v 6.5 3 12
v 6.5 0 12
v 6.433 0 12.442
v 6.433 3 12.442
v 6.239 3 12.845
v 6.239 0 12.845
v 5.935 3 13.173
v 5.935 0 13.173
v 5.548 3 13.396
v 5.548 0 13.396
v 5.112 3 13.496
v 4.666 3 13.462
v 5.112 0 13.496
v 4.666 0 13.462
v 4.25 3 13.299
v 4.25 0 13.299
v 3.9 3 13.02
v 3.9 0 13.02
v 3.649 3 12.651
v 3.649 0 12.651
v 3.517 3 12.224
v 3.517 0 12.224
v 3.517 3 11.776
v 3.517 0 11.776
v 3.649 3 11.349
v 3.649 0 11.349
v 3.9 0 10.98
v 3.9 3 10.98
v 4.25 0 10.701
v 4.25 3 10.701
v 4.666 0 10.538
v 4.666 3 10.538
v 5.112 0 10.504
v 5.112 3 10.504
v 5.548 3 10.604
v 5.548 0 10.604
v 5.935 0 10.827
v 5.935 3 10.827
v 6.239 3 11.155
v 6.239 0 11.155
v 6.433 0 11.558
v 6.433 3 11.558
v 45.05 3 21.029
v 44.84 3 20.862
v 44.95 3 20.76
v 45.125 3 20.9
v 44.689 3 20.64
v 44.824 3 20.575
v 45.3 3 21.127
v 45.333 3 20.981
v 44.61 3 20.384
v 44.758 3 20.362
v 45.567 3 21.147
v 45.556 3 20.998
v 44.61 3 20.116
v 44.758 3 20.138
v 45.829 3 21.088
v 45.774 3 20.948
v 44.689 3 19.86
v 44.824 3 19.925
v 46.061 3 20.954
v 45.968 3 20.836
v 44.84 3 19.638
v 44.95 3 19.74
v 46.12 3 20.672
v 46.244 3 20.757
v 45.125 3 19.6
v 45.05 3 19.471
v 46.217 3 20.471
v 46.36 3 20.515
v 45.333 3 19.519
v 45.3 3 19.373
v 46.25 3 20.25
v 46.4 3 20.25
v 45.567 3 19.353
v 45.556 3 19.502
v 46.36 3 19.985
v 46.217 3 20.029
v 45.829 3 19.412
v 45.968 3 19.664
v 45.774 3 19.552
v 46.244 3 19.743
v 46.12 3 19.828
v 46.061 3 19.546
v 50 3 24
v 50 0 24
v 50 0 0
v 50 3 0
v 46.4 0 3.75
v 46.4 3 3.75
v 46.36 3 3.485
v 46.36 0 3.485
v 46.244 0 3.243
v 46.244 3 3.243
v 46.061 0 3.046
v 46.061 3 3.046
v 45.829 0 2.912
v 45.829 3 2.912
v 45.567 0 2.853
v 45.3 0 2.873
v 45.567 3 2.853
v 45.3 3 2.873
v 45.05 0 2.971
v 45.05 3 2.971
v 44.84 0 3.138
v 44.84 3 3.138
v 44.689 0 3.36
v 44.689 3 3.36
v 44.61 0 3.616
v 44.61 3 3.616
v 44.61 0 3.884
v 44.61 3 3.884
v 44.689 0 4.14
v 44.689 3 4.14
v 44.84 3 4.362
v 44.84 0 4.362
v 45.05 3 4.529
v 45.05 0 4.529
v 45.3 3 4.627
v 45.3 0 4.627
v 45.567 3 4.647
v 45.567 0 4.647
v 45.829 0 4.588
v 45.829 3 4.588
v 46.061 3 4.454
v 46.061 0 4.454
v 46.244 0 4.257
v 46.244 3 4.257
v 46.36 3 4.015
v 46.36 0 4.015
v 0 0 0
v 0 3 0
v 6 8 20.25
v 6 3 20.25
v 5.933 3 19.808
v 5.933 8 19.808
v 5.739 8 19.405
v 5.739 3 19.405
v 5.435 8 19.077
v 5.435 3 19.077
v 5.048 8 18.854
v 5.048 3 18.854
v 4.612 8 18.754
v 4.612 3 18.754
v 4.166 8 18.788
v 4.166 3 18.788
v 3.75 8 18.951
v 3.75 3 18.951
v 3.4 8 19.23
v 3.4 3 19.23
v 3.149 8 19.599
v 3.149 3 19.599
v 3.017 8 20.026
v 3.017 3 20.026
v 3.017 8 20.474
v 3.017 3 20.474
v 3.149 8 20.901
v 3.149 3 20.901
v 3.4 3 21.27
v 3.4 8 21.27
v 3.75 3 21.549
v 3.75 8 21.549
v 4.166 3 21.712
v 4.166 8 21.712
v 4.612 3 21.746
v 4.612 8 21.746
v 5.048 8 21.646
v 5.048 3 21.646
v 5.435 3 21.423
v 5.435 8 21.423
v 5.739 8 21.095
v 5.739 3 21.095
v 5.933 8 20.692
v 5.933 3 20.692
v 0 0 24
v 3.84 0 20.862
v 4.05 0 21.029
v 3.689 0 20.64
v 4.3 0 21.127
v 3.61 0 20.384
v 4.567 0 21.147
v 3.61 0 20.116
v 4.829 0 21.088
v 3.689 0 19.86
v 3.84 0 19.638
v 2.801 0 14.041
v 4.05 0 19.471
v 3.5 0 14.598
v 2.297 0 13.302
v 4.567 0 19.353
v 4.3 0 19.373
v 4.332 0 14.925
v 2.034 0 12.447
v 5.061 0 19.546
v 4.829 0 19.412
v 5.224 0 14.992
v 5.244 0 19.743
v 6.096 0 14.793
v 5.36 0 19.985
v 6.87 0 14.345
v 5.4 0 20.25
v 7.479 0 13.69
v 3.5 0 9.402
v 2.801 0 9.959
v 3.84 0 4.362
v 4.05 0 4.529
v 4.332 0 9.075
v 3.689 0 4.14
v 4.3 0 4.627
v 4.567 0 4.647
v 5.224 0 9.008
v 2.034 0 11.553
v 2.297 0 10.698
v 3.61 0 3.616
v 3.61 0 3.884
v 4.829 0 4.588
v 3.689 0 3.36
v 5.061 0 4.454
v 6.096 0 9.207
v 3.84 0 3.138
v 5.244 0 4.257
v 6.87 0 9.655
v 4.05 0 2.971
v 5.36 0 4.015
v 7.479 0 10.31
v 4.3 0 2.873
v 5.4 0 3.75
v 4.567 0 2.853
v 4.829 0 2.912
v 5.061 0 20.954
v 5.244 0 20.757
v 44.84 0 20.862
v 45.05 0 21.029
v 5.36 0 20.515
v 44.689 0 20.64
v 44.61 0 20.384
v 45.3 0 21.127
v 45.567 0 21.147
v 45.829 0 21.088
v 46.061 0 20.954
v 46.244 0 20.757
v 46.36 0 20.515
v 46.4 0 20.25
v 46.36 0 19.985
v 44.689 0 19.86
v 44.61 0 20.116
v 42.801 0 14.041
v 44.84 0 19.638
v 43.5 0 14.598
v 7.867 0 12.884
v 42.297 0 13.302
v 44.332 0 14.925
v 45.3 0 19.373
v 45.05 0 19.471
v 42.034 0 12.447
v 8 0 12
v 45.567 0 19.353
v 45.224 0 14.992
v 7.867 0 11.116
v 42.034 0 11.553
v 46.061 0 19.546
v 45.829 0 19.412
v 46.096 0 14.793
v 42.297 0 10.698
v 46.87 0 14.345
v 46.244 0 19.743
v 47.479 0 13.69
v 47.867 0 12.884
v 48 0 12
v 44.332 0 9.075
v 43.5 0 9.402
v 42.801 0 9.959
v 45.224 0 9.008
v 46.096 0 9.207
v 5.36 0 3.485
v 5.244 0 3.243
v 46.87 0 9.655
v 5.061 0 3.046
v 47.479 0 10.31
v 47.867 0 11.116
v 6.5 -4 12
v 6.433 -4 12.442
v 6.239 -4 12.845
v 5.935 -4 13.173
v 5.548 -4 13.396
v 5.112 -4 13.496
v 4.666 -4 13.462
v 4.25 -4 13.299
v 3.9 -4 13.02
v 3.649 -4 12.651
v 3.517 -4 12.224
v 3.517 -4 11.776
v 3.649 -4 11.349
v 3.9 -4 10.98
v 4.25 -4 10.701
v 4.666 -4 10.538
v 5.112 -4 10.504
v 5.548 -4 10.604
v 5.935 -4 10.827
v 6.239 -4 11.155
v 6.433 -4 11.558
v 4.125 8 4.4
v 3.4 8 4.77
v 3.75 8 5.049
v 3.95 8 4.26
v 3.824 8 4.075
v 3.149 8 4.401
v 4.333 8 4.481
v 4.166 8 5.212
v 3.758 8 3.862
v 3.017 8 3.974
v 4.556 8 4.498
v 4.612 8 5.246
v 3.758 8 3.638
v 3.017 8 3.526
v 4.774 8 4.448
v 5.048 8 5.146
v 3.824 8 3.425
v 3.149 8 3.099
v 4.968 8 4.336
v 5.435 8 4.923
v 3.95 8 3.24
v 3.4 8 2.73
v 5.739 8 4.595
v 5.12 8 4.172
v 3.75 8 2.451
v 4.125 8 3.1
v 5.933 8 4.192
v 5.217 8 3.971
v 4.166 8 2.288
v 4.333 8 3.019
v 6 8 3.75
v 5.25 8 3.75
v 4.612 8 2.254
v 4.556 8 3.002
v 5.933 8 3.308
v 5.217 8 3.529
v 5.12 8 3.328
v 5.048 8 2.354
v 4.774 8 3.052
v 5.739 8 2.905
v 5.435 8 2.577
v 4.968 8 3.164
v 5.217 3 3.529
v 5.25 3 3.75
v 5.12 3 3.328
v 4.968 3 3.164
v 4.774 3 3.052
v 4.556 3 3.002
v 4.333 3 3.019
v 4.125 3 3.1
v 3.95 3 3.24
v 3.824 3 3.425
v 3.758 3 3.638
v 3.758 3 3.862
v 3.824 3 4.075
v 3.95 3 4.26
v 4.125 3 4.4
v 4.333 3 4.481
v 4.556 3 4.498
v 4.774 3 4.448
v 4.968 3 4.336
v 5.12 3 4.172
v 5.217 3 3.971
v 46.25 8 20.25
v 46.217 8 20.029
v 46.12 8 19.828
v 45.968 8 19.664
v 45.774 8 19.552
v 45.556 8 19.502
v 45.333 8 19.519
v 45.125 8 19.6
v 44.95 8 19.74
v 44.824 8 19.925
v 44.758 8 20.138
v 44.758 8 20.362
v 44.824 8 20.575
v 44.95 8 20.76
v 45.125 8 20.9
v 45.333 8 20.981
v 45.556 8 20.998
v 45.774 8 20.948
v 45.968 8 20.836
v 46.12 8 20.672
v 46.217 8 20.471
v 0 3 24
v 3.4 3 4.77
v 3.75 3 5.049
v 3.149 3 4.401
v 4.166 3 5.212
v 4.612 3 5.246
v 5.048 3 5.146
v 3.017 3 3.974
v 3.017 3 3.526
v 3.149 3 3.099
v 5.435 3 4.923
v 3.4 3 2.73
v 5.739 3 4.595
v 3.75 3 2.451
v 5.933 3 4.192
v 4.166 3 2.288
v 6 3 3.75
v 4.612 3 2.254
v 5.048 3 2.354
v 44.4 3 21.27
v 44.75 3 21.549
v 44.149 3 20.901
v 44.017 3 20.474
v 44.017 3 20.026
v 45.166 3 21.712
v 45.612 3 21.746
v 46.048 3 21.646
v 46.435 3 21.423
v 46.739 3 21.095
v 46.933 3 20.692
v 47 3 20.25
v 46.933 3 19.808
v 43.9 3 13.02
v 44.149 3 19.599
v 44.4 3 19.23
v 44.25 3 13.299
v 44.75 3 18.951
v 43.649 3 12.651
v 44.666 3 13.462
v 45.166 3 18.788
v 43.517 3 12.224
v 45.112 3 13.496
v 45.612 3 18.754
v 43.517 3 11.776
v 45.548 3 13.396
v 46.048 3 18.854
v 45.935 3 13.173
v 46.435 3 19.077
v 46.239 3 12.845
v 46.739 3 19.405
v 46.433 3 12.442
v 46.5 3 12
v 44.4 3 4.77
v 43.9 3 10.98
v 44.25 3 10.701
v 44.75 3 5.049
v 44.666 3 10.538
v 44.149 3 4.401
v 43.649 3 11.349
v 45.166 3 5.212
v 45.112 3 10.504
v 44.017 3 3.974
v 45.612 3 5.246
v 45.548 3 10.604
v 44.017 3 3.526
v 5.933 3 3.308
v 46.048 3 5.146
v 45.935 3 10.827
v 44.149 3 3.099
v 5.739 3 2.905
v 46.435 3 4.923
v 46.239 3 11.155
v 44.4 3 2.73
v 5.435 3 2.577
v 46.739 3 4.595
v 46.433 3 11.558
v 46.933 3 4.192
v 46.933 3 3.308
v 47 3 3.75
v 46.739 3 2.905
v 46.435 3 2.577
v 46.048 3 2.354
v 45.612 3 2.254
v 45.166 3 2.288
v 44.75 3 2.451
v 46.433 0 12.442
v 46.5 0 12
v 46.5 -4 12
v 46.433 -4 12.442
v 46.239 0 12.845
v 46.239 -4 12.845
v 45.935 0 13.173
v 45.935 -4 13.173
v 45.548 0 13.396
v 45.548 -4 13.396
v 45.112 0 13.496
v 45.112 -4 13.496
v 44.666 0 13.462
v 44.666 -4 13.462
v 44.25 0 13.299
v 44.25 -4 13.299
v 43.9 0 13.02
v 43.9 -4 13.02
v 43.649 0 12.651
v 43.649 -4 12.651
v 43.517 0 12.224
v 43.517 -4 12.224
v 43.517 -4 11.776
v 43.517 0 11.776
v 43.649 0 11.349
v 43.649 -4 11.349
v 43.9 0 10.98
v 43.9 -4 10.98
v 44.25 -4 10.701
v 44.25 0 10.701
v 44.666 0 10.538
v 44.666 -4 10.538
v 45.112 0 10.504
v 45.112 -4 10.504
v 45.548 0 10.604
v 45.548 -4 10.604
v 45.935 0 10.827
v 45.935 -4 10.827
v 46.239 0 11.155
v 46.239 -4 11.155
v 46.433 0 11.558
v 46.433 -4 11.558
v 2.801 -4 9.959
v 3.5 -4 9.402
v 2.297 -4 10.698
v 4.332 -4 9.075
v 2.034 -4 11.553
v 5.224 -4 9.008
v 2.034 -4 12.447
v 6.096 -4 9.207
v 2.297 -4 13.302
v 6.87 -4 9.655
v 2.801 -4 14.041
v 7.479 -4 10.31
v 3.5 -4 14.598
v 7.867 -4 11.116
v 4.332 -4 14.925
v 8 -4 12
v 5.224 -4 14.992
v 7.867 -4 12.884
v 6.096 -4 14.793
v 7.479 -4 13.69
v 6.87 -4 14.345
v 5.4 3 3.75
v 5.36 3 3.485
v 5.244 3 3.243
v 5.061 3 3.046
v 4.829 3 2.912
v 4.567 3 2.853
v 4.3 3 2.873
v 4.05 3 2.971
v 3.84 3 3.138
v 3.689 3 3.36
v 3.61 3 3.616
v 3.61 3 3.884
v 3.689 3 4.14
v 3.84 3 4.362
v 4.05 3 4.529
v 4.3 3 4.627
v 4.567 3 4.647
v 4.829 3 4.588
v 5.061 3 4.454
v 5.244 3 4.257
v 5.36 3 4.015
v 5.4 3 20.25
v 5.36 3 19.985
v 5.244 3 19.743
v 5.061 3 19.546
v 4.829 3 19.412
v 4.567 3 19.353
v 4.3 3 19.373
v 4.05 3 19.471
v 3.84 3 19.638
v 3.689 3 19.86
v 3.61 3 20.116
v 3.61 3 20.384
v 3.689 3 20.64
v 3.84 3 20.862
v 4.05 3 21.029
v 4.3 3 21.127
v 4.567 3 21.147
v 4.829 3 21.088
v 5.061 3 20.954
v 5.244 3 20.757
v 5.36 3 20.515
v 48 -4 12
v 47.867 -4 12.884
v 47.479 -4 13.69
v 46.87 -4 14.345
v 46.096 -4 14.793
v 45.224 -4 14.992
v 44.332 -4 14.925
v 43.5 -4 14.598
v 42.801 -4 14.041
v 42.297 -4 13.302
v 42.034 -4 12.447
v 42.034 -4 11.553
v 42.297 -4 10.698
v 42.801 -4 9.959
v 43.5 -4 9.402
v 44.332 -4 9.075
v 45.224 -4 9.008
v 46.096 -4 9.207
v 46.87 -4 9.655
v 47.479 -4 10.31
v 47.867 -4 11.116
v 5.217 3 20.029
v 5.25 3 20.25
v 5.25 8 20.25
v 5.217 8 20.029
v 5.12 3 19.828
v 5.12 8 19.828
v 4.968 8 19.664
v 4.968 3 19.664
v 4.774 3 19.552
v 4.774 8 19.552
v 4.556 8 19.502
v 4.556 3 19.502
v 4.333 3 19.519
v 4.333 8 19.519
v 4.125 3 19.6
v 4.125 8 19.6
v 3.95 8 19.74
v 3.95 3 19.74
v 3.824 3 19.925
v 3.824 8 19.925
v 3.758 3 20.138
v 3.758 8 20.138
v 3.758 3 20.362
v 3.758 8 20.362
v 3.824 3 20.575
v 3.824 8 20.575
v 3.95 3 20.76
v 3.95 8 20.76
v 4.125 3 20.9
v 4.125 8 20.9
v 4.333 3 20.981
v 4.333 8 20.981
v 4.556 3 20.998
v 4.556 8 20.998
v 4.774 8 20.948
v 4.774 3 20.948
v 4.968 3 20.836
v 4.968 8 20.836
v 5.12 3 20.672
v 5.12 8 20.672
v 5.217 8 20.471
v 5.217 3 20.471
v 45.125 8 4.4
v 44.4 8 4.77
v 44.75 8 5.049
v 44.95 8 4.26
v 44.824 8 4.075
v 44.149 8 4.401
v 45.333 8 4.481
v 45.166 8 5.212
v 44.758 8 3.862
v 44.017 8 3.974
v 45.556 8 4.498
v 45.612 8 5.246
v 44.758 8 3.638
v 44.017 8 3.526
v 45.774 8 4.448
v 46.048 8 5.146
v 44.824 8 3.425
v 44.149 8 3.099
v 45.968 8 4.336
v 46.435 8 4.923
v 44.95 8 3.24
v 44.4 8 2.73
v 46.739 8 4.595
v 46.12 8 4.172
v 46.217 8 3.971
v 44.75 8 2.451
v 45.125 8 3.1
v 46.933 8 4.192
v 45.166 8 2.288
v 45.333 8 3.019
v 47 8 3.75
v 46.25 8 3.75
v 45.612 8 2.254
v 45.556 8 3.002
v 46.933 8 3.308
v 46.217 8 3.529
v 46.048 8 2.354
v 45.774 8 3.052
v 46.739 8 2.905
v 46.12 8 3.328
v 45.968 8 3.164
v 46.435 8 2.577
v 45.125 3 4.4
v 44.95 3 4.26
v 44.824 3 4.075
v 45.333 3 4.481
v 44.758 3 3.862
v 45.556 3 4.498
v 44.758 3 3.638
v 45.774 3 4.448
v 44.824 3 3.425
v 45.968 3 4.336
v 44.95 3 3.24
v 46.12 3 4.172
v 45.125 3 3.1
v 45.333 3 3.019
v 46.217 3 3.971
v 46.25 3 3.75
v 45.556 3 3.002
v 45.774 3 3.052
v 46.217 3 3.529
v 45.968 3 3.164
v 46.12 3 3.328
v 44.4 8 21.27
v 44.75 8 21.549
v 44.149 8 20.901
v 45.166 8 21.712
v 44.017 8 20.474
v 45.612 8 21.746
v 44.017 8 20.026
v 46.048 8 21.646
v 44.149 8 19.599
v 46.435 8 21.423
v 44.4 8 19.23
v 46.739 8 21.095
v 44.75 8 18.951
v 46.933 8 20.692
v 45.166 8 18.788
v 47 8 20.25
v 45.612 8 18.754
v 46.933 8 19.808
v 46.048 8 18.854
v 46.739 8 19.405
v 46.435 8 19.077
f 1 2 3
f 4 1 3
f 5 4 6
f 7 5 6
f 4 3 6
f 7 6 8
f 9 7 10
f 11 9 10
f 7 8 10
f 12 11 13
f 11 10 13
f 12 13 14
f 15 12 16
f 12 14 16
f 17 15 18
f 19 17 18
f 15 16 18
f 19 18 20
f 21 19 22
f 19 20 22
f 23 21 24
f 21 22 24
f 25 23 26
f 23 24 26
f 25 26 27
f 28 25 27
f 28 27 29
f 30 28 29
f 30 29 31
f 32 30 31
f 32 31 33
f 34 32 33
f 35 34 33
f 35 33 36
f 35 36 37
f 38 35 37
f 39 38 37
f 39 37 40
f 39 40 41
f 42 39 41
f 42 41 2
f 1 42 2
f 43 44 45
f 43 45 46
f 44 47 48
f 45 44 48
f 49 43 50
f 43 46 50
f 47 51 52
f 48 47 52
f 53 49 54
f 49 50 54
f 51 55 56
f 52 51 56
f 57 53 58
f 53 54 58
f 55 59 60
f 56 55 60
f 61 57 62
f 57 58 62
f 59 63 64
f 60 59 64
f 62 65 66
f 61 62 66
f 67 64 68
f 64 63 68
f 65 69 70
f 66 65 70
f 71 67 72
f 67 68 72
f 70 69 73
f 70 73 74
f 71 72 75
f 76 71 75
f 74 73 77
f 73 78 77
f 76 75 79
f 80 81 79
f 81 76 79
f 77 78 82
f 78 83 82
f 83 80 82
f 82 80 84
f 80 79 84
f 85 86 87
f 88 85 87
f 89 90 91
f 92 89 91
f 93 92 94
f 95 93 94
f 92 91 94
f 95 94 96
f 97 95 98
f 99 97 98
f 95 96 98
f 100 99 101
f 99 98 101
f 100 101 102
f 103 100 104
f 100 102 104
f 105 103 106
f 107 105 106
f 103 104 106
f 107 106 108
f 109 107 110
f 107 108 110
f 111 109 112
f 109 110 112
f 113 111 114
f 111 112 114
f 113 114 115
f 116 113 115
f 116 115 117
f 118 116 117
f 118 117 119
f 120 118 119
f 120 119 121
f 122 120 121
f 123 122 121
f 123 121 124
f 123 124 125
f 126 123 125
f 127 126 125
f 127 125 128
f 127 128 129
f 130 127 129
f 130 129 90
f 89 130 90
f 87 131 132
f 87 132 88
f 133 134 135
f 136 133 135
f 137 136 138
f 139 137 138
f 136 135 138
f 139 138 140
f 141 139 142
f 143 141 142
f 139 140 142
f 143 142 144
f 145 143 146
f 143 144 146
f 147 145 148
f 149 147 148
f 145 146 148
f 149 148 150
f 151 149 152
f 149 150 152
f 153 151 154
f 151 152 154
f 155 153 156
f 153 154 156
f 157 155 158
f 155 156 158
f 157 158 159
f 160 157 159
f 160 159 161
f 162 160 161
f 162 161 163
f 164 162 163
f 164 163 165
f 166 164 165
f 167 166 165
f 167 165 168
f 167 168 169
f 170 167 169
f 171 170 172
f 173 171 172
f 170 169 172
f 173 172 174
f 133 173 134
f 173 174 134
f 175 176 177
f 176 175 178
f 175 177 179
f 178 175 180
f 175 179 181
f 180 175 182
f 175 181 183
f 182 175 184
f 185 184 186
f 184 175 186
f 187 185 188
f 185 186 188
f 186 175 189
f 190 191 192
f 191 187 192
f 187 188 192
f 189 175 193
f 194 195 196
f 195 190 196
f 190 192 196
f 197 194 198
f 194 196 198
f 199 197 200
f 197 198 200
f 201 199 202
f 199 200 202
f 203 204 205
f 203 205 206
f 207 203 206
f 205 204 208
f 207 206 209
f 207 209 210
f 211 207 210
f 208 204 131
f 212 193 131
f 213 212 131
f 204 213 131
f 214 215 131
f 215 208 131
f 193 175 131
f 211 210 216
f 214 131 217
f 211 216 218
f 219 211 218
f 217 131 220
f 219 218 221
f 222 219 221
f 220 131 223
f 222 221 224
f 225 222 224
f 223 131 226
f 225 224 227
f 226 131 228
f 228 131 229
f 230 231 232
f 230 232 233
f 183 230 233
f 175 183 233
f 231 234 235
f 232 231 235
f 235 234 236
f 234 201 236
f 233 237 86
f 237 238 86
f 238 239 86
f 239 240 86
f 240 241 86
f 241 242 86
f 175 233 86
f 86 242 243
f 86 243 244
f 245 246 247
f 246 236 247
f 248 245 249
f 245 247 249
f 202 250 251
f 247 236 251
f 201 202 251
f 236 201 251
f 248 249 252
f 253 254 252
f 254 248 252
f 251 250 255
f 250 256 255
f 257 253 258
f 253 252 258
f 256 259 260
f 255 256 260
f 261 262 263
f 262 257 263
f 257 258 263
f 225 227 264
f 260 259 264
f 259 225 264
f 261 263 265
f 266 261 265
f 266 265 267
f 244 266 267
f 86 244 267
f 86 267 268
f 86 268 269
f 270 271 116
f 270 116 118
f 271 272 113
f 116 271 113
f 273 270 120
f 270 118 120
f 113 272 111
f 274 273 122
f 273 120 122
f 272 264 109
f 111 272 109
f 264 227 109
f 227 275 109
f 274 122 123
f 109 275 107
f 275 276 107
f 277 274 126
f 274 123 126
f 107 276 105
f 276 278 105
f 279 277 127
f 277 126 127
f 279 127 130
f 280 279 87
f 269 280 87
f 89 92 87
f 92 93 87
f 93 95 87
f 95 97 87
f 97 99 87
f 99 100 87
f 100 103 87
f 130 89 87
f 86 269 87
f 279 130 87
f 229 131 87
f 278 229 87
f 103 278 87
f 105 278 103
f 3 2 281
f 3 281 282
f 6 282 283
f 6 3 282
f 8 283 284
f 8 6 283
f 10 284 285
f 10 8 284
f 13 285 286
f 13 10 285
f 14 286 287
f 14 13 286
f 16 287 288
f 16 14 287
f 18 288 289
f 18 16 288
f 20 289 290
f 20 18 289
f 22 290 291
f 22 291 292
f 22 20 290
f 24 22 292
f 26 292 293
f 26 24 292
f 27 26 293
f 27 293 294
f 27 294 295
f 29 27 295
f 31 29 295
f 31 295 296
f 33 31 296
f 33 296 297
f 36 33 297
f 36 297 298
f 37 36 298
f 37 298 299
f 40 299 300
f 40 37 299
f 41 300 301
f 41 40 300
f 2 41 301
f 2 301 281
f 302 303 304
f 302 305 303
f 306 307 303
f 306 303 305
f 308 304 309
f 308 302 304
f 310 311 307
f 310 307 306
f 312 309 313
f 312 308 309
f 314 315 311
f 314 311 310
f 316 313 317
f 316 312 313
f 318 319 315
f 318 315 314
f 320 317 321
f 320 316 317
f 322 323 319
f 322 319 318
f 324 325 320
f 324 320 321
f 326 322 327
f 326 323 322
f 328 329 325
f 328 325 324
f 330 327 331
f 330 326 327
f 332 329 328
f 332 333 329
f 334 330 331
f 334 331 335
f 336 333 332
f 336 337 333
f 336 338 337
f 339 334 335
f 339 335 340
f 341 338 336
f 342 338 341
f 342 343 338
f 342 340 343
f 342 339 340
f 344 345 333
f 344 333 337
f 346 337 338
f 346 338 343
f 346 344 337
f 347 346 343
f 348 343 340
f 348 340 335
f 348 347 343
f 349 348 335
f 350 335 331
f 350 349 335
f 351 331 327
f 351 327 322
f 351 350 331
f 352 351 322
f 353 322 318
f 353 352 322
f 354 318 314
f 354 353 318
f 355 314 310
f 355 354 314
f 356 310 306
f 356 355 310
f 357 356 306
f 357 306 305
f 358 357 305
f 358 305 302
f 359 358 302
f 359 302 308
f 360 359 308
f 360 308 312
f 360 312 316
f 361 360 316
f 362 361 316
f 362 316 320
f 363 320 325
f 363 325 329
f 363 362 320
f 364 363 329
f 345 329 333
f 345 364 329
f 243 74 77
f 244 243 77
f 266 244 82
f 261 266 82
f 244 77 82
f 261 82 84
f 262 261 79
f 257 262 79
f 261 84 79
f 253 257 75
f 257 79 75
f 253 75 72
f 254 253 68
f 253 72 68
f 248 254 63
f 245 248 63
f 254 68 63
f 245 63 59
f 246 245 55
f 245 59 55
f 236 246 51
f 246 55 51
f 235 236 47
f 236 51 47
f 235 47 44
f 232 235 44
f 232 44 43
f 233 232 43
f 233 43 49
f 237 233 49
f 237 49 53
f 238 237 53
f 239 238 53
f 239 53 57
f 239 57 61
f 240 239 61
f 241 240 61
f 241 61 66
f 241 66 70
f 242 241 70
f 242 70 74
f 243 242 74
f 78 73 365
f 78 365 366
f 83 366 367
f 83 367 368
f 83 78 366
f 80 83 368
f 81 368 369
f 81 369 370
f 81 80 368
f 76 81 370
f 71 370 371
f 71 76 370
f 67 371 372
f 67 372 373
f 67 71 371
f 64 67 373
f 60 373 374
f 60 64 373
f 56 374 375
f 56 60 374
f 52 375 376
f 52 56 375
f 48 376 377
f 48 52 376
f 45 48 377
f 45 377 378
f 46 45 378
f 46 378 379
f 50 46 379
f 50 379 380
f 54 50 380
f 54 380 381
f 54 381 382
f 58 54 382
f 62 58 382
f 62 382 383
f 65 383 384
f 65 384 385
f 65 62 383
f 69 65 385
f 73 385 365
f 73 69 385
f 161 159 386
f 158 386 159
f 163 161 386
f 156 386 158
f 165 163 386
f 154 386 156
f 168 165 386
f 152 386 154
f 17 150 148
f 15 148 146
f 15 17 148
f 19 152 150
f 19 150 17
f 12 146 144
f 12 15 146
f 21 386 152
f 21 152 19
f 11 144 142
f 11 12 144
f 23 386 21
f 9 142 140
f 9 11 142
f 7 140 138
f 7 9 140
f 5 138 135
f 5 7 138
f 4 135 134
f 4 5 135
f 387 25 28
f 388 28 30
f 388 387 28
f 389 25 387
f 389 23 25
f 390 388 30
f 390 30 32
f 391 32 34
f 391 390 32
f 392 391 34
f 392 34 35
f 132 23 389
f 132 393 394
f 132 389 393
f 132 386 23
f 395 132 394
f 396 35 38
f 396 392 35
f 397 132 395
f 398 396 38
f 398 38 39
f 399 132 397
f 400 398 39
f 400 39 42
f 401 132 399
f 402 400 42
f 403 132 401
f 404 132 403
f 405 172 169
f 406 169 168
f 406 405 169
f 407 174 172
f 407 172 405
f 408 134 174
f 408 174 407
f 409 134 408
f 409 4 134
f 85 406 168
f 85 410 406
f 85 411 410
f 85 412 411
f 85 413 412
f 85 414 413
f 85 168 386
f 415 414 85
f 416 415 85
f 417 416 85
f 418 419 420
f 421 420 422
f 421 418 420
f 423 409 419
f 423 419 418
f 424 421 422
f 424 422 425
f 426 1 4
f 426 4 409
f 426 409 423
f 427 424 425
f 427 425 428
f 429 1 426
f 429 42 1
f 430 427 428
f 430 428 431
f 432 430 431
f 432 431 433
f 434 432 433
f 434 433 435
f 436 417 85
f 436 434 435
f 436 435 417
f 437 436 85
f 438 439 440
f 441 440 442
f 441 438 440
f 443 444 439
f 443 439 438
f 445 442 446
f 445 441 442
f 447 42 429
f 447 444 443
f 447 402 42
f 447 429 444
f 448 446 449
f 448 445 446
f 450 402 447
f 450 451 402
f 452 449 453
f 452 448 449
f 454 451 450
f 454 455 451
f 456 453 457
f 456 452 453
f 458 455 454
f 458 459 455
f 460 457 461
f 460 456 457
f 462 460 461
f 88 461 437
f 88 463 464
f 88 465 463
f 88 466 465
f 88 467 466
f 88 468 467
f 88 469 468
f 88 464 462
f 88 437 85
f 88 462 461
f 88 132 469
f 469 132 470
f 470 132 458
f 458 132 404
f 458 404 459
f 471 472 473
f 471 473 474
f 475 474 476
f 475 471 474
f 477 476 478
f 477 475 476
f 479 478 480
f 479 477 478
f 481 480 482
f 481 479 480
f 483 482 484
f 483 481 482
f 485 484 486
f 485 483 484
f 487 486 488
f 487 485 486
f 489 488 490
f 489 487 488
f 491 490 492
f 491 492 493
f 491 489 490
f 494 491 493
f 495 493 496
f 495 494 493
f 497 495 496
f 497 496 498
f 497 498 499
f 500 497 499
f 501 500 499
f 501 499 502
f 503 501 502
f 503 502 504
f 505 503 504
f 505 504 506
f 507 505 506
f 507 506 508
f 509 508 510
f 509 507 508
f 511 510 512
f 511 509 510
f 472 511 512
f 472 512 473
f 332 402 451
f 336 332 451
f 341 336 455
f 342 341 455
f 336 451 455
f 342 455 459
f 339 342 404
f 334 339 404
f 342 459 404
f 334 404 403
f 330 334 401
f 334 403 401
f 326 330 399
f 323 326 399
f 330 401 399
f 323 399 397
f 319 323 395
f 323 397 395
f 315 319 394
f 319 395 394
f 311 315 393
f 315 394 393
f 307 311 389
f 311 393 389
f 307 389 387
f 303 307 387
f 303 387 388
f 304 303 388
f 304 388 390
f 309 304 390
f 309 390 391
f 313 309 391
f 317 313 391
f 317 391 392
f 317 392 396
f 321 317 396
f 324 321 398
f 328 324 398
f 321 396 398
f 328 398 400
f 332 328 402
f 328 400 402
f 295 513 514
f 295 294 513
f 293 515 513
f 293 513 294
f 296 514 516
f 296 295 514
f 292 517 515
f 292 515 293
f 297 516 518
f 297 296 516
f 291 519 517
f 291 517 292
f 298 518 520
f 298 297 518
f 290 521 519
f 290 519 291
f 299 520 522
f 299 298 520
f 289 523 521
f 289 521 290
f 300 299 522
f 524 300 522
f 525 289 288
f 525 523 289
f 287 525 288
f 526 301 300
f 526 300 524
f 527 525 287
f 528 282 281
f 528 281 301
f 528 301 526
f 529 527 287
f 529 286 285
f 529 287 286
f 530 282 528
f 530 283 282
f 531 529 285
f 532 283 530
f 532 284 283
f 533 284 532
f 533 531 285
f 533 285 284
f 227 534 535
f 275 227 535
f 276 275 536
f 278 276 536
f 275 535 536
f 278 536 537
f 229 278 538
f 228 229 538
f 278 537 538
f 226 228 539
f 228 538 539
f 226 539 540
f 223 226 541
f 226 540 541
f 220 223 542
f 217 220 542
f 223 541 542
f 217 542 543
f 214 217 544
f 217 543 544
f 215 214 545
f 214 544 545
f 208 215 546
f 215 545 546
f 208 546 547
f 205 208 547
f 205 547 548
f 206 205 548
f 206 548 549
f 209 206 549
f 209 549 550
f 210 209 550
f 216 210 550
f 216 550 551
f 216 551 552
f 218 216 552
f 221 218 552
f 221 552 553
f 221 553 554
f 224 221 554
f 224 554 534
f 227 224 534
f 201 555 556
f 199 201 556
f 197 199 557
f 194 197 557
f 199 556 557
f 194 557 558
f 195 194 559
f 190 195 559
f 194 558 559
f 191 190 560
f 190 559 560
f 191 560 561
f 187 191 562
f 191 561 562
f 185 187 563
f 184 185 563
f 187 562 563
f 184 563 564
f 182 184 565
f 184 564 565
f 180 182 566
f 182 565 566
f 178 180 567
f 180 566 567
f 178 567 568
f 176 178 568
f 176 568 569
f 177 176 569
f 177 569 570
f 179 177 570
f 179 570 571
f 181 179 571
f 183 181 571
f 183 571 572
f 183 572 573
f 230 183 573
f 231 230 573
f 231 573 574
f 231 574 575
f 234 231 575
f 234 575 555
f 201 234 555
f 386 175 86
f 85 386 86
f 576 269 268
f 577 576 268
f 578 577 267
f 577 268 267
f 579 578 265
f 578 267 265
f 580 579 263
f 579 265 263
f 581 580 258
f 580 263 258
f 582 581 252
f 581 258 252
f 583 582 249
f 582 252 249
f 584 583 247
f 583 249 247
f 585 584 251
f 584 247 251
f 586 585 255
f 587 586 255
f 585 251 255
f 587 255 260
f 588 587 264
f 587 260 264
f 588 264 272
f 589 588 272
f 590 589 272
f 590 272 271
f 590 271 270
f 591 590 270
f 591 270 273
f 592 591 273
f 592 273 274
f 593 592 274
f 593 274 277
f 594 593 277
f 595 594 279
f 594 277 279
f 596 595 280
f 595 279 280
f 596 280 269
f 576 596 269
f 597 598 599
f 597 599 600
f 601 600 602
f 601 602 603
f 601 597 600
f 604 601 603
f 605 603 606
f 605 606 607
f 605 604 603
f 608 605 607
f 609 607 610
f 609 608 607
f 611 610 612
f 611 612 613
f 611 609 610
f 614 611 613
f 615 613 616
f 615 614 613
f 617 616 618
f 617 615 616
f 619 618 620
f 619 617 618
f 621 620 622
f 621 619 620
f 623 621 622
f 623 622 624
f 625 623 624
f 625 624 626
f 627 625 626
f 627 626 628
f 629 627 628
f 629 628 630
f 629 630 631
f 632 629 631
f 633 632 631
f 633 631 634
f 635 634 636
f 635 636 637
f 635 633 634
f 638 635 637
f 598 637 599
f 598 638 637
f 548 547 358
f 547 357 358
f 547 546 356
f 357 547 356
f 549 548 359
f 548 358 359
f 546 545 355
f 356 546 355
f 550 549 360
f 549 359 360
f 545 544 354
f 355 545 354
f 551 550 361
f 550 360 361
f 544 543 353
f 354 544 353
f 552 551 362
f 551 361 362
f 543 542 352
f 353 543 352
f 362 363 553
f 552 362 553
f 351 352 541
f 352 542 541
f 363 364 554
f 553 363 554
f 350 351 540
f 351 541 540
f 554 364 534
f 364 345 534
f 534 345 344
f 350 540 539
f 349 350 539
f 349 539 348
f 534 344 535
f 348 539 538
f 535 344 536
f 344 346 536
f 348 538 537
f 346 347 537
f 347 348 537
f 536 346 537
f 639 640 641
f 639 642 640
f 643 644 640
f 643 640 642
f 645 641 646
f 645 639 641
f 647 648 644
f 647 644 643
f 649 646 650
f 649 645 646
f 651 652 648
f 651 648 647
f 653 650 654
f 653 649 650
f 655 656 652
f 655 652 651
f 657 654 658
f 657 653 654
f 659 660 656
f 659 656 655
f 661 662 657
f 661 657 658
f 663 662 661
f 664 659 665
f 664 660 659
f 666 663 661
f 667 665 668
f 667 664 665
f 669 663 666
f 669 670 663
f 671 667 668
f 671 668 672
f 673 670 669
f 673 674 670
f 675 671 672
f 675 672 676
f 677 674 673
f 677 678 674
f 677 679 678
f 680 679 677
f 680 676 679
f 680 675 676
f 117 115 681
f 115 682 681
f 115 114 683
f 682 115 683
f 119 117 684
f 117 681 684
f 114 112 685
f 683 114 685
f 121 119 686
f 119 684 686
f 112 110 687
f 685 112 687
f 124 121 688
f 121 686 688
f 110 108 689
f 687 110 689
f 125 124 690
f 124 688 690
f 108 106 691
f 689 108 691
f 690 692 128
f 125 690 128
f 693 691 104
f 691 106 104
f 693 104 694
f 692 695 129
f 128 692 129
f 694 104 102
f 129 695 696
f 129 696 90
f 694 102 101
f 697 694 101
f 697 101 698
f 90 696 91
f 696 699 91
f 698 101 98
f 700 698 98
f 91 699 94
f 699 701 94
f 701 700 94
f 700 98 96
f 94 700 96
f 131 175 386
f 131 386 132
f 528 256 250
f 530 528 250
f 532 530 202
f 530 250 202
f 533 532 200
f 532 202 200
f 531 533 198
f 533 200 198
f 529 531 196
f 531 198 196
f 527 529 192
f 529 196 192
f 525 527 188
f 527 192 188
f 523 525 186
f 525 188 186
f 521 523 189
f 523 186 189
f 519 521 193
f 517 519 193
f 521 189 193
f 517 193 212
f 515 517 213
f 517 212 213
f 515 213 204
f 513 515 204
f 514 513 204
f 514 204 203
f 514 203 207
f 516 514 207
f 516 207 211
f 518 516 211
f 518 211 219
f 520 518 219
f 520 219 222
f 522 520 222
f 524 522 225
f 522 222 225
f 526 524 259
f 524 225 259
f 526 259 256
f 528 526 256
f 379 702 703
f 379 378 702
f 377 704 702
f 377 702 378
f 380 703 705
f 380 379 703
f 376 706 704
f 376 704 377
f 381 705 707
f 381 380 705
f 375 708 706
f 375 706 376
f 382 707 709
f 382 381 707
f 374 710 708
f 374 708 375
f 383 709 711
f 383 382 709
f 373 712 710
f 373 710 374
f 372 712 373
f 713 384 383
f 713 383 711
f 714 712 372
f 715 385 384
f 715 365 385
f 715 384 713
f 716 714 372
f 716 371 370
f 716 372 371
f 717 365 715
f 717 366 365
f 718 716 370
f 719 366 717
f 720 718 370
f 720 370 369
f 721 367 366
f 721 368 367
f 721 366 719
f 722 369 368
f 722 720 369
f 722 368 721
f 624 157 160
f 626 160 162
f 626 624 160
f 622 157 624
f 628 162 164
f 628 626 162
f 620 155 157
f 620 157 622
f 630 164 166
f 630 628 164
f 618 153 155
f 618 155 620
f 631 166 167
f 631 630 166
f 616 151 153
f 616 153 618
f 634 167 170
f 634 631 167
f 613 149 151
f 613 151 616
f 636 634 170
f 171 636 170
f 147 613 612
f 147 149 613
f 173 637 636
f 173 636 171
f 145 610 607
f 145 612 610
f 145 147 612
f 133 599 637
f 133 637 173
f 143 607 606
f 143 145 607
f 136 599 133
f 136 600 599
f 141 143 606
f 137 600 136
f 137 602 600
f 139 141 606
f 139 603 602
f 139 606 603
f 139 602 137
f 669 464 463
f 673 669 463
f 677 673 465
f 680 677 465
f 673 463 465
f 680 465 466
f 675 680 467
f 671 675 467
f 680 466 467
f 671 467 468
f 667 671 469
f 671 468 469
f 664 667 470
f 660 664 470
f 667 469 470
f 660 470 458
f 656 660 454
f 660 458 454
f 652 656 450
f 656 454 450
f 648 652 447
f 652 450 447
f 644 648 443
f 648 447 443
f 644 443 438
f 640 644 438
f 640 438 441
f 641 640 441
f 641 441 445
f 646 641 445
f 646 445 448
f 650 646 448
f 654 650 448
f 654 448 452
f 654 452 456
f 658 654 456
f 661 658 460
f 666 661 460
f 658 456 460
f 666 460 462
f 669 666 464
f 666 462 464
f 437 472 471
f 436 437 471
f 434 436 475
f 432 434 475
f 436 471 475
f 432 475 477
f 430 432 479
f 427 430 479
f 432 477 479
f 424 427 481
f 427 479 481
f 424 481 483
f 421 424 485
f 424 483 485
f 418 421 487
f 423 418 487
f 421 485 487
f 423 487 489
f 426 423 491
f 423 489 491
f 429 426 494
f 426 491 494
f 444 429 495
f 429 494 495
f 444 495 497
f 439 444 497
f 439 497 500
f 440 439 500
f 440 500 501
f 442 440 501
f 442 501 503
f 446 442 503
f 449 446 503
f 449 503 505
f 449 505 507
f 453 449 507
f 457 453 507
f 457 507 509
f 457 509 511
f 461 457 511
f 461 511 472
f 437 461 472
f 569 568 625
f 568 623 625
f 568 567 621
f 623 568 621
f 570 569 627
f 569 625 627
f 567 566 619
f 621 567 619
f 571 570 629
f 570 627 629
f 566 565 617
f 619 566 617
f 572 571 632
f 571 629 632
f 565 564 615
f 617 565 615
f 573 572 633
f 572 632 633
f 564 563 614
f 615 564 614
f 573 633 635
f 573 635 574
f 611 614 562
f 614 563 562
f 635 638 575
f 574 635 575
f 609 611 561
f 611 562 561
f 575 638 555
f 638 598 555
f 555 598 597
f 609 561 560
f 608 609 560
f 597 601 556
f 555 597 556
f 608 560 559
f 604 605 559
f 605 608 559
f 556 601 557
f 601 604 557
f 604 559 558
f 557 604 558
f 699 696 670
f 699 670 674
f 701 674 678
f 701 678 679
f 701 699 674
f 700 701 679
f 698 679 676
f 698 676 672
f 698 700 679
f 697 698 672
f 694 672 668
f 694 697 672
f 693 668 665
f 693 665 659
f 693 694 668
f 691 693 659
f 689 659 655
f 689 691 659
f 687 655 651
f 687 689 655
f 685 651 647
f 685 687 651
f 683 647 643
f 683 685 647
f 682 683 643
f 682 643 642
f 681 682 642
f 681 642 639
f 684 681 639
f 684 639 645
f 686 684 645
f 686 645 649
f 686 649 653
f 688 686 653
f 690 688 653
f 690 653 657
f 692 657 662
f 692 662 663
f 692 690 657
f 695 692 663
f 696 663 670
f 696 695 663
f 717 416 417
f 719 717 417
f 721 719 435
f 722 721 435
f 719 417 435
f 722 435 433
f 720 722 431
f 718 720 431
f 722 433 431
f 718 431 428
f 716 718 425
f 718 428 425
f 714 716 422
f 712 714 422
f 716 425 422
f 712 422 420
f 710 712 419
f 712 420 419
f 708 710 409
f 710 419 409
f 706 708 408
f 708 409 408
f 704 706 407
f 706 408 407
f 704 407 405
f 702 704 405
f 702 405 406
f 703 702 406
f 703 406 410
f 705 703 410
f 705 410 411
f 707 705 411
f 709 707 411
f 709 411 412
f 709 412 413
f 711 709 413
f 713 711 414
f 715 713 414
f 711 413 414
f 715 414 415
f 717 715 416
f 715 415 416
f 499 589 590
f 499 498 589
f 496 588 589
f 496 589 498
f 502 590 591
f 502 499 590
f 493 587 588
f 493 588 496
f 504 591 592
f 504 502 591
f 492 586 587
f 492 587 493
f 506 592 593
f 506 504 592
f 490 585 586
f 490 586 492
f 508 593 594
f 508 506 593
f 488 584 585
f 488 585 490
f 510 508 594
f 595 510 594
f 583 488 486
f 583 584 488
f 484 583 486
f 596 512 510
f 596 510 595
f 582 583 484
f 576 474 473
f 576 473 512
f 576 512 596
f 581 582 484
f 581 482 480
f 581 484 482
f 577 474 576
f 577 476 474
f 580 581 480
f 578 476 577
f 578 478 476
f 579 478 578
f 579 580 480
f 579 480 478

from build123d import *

# Parameters (mm, degrees)
SKETCH1_W           = 50
SKETCH1_H           = 24
BOSS_EXTRUDE1_DEPTH = 3
SKETCH2_R           = 3
SKETCH2_R_2         = 1.5
BOSS_EXTRUDE2_DEPTH = 4
SKETCH3_R           = 0.9
CUT_EXTRUDE1_DEPTH  = 10
SKETCH4_R           = 1.5
SKETCH4_R_2         = 0.75
BOSS_EXTRUDE3_DEPTH = 5
SKETCH5_R           = 1.5
CUT_EXTRUDE2_DEPTH  = 10


with BuildPart() as part:
    # Sketch1 → Boss-Extrude1 (new body)
    with BuildSketch(Plane(origin=(0, 0, 0), x_dir=(1, 0, 0), z_dir=(0, 1, 0))):
        with Locations((25, -12)):
            Rectangle(SKETCH1_W, SKETCH1_H)
    extrude(amount=BOSS_EXTRUDE1_DEPTH)

    # Sketch2 → Boss-Extrude2 (add)
    with BuildSketch(Plane.XZ):
        with Locations((5, 12)):
            Circle(SKETCH2_R)
        with Locations((5, 12)):
            Circle(SKETCH2_R_2, mode=Mode.SUBTRACT)
        with Locations((45, 12)):
            Circle(SKETCH2_R)
        with Locations((45, 12)):
            Circle(SKETCH2_R_2, mode=Mode.SUBTRACT)
    extrude(amount=BOSS_EXTRUDE2_DEPTH)

    # Sketch3 → Cut-Extrude1 (cut)
    with BuildSketch(Plane(origin=(0, 3, 0), x_dir=(1, 0, 0), z_dir=(0, 1, 0))):
        with Locations((4.5, -3.75)):
            Circle(SKETCH3_R)
        with Locations((45.5, -3.75)):
            Circle(SKETCH3_R)
        with Locations((45.5, -20.25)):
            Circle(SKETCH3_R)
        with Locations((4.5, -20.25)):
            Circle(SKETCH3_R)
    extrude(amount=-CUT_EXTRUDE1_DEPTH, mode=Mode.SUBTRACT)

    # Sketch4 → Boss-Extrude3 (add)
    with BuildSketch(Plane(origin=(0, 3, 0), x_dir=(1, 0, 0), z_dir=(0, 1, 0))):
        with Locations((4.5, -3.75)):
            Circle(SKETCH4_R)
        with Locations((4.5, -3.75)):
            Circle(SKETCH4_R_2, mode=Mode.SUBTRACT)
        with Locations((45.5, -3.75)):
            Circle(SKETCH4_R)
        with Locations((45.5, -3.75)):
            Circle(SKETCH4_R_2, mode=Mode.SUBTRACT)
        with Locations((4.5, -20.25)):
            Circle(SKETCH4_R)
        with Locations((4.5, -20.25)):
            Circle(SKETCH4_R_2, mode=Mode.SUBTRACT)
        with Locations((45.5, -20.25)):
            Circle(SKETCH4_R)
        with Locations((45.5, -20.25)):
            Circle(SKETCH4_R_2, mode=Mode.SUBTRACT)
    extrude(amount=BOSS_EXTRUDE3_DEPTH)

    # Sketch5 → Cut-Extrude2 (cut)
    with BuildSketch(Plane.XZ):
        with Locations((5, 12)):
            Circle(SKETCH5_R)
        with Locations((45, 12)):
            Circle(SKETCH5_R)
    extrude(amount=-CUT_EXTRUDE2_DEPTH, mode=Mode.SUBTRACT)


solid = part.part
